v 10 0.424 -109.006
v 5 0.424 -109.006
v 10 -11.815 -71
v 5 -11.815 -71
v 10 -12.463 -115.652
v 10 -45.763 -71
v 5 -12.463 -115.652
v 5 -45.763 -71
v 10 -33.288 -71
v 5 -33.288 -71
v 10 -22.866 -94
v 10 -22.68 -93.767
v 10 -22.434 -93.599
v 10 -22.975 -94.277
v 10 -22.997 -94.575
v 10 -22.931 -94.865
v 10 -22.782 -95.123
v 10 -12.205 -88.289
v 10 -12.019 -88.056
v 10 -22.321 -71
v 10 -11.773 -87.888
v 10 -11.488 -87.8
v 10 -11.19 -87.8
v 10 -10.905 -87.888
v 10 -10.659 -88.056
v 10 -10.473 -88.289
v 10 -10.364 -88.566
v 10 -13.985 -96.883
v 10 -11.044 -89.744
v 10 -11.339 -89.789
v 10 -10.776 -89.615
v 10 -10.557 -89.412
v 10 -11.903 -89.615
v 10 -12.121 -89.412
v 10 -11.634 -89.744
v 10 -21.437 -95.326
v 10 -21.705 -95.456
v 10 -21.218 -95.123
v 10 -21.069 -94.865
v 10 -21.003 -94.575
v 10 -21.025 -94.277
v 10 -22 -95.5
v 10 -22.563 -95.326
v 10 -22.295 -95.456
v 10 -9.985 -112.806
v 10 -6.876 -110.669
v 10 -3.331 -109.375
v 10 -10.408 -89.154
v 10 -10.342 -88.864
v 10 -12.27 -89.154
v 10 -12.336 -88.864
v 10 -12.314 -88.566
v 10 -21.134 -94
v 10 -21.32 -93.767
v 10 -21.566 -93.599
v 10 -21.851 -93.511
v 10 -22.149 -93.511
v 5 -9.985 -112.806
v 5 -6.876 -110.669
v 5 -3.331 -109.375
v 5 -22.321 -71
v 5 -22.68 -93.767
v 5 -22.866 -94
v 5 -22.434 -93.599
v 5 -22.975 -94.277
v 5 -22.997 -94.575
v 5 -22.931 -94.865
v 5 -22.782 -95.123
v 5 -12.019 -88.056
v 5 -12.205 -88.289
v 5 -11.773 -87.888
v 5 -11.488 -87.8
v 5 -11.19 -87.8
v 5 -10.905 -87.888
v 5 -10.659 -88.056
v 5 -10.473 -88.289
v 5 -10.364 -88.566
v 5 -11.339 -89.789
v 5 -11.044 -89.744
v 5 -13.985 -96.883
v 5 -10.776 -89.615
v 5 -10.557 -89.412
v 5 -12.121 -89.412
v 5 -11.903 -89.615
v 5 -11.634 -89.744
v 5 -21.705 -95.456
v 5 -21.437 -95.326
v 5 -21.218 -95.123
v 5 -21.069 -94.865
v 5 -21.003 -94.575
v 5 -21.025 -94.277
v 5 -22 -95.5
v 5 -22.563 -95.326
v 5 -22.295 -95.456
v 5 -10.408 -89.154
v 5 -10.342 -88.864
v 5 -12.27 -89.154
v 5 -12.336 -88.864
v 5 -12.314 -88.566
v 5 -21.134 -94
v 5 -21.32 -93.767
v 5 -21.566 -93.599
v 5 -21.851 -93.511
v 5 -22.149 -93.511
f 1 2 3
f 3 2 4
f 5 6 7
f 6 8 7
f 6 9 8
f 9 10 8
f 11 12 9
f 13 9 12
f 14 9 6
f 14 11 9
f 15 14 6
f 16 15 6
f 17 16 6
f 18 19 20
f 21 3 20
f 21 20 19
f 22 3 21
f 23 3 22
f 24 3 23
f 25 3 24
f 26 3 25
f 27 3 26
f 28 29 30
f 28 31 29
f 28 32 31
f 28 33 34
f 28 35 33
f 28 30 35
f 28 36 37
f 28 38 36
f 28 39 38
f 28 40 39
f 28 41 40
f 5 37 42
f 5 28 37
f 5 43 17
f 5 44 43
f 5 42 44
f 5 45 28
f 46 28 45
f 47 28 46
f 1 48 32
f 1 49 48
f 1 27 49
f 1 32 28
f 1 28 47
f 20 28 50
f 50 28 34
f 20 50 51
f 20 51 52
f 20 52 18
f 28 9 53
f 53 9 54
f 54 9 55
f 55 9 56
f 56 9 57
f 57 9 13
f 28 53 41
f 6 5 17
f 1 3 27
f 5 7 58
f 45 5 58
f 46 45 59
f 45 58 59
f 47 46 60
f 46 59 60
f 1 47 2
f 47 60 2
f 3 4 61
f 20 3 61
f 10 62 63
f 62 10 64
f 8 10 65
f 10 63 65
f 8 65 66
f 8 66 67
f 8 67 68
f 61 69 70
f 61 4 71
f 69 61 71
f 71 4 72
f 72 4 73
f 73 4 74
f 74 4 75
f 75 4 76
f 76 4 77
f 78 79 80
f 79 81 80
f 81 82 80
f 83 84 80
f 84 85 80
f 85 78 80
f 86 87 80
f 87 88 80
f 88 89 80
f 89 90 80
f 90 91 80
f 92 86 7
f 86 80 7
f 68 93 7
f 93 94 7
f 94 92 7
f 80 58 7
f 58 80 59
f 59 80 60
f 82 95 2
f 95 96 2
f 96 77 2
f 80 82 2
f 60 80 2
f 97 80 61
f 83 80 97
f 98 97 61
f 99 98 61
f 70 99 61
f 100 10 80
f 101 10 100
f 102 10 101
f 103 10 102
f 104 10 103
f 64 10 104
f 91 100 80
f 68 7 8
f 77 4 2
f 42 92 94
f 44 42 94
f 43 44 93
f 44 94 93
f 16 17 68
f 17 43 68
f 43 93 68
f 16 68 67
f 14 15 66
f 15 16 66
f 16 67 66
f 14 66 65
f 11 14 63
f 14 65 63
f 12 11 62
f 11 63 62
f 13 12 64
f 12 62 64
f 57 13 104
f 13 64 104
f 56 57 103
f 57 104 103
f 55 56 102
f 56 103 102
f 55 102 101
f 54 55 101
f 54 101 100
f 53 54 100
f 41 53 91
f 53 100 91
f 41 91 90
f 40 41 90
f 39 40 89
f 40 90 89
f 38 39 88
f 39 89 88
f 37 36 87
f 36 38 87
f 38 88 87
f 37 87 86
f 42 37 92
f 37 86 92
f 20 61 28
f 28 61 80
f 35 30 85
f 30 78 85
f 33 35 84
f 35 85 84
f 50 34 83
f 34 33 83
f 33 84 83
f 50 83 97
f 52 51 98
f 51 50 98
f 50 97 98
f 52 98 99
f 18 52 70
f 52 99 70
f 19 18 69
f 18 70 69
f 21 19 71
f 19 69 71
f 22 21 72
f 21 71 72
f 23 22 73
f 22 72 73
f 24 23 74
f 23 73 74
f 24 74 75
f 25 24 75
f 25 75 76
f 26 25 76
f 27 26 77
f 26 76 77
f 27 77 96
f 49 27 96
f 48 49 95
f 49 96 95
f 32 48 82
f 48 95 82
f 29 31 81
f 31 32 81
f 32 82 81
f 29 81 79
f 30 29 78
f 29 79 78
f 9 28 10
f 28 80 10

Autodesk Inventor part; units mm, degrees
ref_plane "YZ Plane" through (0, 0, 0) normal (1, 0, 0) x (0, 1, 0)
ref_plane "XZ Plane" through (0, 0, 0) normal (0, 1, 0) x (-1, 0, 0)
ref_plane "XY Plane" through (0, 0, 0) normal (0, 0, 1) x (1, 0, 0)
sketch "Sketch1" plane through (0, 0, 0) normal (1, 0, 0) x (0, 1, 0)
  circle A0 centre (0, -124) radius 1.95
  circle A1 centre (0, 124) radius 1.95
  circle A2 centre (-19, -65) radius 1.5
  circle A3 centre (-19, 65) radius 1.5
  line L0 (0, 124) -> (-19, 65) construction
  line L1 (4.7593, 122.4673) -> (-14.2407, 63.4673)
  line L2 (-23.7593, 66.5327) -> (-4.7593, 125.5327)
  arc A4 (4.7593, 122.4673) -> (-4.7593, 125.5327) centre (0, 124) ccw
  arc A5 (-23.7593, 66.5327) -> (-14.2407, 63.4673) centre (-19, 65) ccw
  line L3 (-19, 65) -> (-19, -65) construction
  line L4 (-24, 65) -> (-24, -65)
  line L5 (-14, -65) -> (-14, 65)
  arc A6 (-14, 65) -> (-24, 65) centre (-19, 65) ccw
  arc A7 (-24, -65) -> (-14, -65) centre (-19, -65) ccw
  line L6 (-19, -65) -> (0, -124) construction
  line L7 (-23.7593, -66.5327) -> (-4.7593, -125.5327)
  line L8 (4.7593, -122.4673) -> (-14.2407, -63.4673)
  arc A8 (-14.2407, -63.4673) -> (-23.7593, -66.5327) centre (-19, -65) ccw
  arc A9 (-4.7593, -125.5327) -> (4.7593, -122.4673) centre (0, -124) ccw
  circle A10 centre (-44, 65) radius 1.5
  circle A11 centre (-44, -65) radius 1.5
  line L9 (-19, 65) -> (-44, 65) construction
  line L10 (-19, 67) -> (-44, 67)
  line L11 (-44, 63) -> (-19, 63)
  arc A12 (-19, 63) -> (-19, 67) centre (-19, 65) ccw
  arc A13 (-44, 67) -> (-44, 63) centre (-44, 65) ccw
  line L12 (-19, -65) -> (-44, -65) construction
  line L13 (-19, -63) -> (-44, -63)
  line L14 (-44, -67) -> (-19, -67)
  arc A14 (-19, -67) -> (-19, -63) centre (-19, -65) ccw
  arc A15 (-44, -63) -> (-44, -67) centre (-44, -65) ccw
  line L15 (0, 124) -> (-44, 65) construction
  line L16 (-4.0081, 126.9891) -> (-48.0081, 67.9891)
  line L17 (-39.9919, 62.0109) -> (4.0081, 121.0109)
  arc A16 (4.0081, 121.0109) -> (-4.0081, 126.9891) centre (0, 124) ccw
  arc A17 (-48.0081, 67.9891) -> (-39.9919, 62.0109) centre (-44, 65) ccw
  line L18 (-44, -65) -> (0, -124) construction
  line L19 (-48.0081, -67.9891) -> (-4.0081, -126.9891)
  line L20 (4.0081, -121.0109) -> (-39.9919, -62.0109)
  arc A18 (-39.9919, -62.0109) -> (-48.0081, -67.9891) centre (-44, -65) ccw
  arc A19 (-4.0081, -126.9891) -> (4.0081, -121.0109) centre (0, -124) ccw
  line L21 (-44, 65) -> (-44, -65) construction
  line L22 (-46.5, 65) -> (-46.5, -65)
  line L23 (-41.5, -65) -> (-41.5, 65)
  arc A20 (-41.5, 65) -> (-46.5, 65) centre (-44, 65) ccw
  arc A21 (-46.5, -65) -> (-41.5, -65) centre (-44, -65) ccw
  line L24 (-44, 65) -> (-19, 0) construction
  line L25 (-45.4, 64.4615) -> (-20.4, -0.5385)
  line L26 (-17.6, 0.5385) -> (-42.6, 65.5385)
  arc A22 (-42.6, 65.5385) -> (-45.4, 64.4615) centre (-44, 65) ccw
  arc A23 (-20.4, -0.5385) -> (-17.6, 0.5385) centre (-19, 0) ccw
  line L27 (-44, -65) -> (-19, 0) construction
  line L28 (-42.6, -65.5385) -> (-17.6, -0.5385)
  line L29 (-20.4, 0.5385) -> (-45.4, -64.4615)
  arc A24 (-45.4, -64.4615) -> (-42.6, -65.5385) centre (-44, -65) ccw
  arc A25 (-17.6, -0.5385) -> (-20.4, 0.5385) centre (-19, 0) ccw
  line L30 (-19, 0) -> (-44, 0) construction
  line L31 (-19, 1.5) -> (-44, 1.5)
  line L32 (-44, -1.5) -> (-19, -1.5)
  arc A26 (-19, -1.5) -> (-19, 1.5) centre (-19, 0) ccw
  arc A27 (-44, 1.5) -> (-44, -1.5) centre (-44, 0) ccw
  circle A28 centre (-19, -10) radius 1.5
  circle A29 centre (-19, -35) radius 1.5
  circle A30 centre (-19, 10) radius 1.5
  circle A31 centre (-19, 35) radius 1.5
  circle A32 centre (0, -124) radius 12.5
  circle A33 centre (0, 124) radius 12.5
  circle A34 centre (-22, 94.5) radius 1
  circle A35 centre (-22, -94.5) radius 1
  circle A36 centre (-11.3392, 88.7888) radius 1
  circle A37 centre (-11.3392, -88.7888) radius 1
  circle A38 centre (-19, 0) radius 1
  point P0 (0, 0)
  point P1 (-9.5, 94.5)
  point P2 (-9.5, -94.5)
  point P3 (-14, -64.2148)
  point P4 (-14, 64.2148)
  point P5 (-24, 65)
  point P6 (-31.5, 65)
  point P7 (-31.5, -65)
  point P8 (-44, 0)
  point P9 (-31.5, 32.5)
  point P10 (-31.5, -32.5)
  point P11 (-41.5, 54.3215)
  point P12 (-24, 8.8215)
  point P13 (-24, 17.1785)
  point P14 (-41.6236, 63)
  point P15 (-24, 63)
  point P16 (-23.6088, 67)
  point P17 (-36.2712, 67)
  point P18 (-13.9854, 96.8832)
  point P19 (-6.8749, 118.9633)
  point P20 (-43.3898, 70)
  point P21 (-46.5, -65)
  point P22 (-43.3898, -70)
  point P23 (-6.8749, -118.9633)
  point P24 (-13.9854, -96.8832)
  point P25 (-36.2712, -67)
  point P26 (-23.6088, -67)
  point P27 (-24, -63)
  point P28 (-41.6236, -63)
  point P29 (-24, -17.1785)
  point P30 (-24, -8.8215)
  point P31 (-41.5, -54.3215)
  point P32 (-31.5, 0)
  point P33 (-41.5, -1.5)
  point P34 (-24, -1.5)
  point P35 (-24, 1.5)
  point P36 (-41.5, 1.5)
  point P37 (-46.5, 60.6699)
  point P38 (-46.5, -60.6699)
  point P39 (-4.0081, -126.9891)
  point P40 (-41.5, 63)
  point P41 (-23.5826, 67)
  point P42 (-41.5, -63)
  point P43 (-41.5, -62.6785)
  point P44 (-41.5, 62.6785)
  point P45 (-10.8571, -117.8053)
  point P46 (1.2475, -111.5624)
  point P47 (-10.8571, 117.8053)
  point P48 (1.2475, 111.5624)
  point P49 (-40.8878, -61.0867)
  point P50 (-41.5, 60.6699)
  dimension "d2" = 3.9
  dimension "d4" = 3.9
  dimension "d25" = 3
  dimension "d28" = 3
  dimension "d43" = 59
  dimension "d44" = 65
  dimension "d45" = 65
  dimension "d47" = 59
  dimension "d48" = 10
  dimension "d49" = 10
  dimension "d50" = 10
  dimension "d52" = 14
  dimension "d53" = 3
  dimension "d54" = 3
  dimension "d55" = 4
  dimension "d56" = 4
  dimension "d57" = 25
  dimension "d58" = 25
  dimension "d59" = 10
  dimension "d60" = 10
  dimension "d61" = 5
  dimension "d62" = 3
  dimension "d63" = 3
  dimension "d64" = 3
  dimension "d65" = 3
  dimension "d66" = 3
  dimension "d67" = 10
  dimension "d68" = 25
  dimension "d69" = 3
  dimension "d70" = 3
  dimension "d71" = 10
  dimension "d72" = 25
  dimension "d73" = 25
  dimension "d74" = 25
  dimension "d76" = 2
  dimension "d78" = 2
  dimension "d79" = 2
  dimension "d80" = 2
  dimension "d81" = 6
  dimension "d82" = 6
  dimension "d83" = 2
extrude "Extrusion1" add sketch "Sketch1" along normal blind 5 contours A4 L16 A33 L1 | A16 L17 A33 L2 A4 | L1 A33 L17 A16 | L1 L5 A6 L10 L2 L17 A33 | A4 L2 A33 L16 | L5 L8 A8 L13 L4 L28 A23 L26 L11 A5 L1 | L1 A5 L11 A12 L10 A6 L5 | L17 L2 A33 | A33 L2 L17 L10 A20 L22 A17 L16 | L8 A32 L20 L7 L14 A7 L5 | L5 A7 L14 A14 L13 A8 L8 | L11 L4 A5 | A5 A6 L10 A12 L11 | A32 L19 A9 L8 | L8 A19 L20 A32 | A6 L2 L10 | L2 A5 L4 L11 L17 L10 | L17 L11 L23 A20 L10 | L22 A20 L10 A13 L25 A17 | A17 L25 L23 L31 A27 L32 L29 A18 L22 | L14 L7 A7 | A7 A8 L13 A14 L14 | A9 L7 A32 L20 A19 | A32 L7 L20 | A8 L4 L13 | A20 L23 L11 L26 A10 L25 A13 L10 | L25 A13 L11 L26 L23 A17 | A17 L23 L25 | L22 A21 L14 L20 L7 A32 L19 A18 | A18 L29 A15 L14 A21 L22 | L26 A25 L31 L25 L4 | L4 L25 L23 A17 L26 | L7 L14 L20 L13 L4 A7 | L19 A32 L7 A9 | L23 L26 L11 | L23 L26 A17 | L25 A10 L26 L11 A13 | L29 L23 A18 | A18 L23 L28 L13 A15 L29 | L25 L31 L4 | A23 L25 L29 A25 | L14 A21 L23 L13 L20 | L28 A18 L23 L29 L4 | L4 L29 L32 A23 L28 | L31 L4 L32 L23 | L23 L32 A27 L31 | A18 L28 L23 | L29 A11 L28 L13 L23 A21 L14 A15 | A15 L13 L28 A11 L29 | L31 L25 L29 L32 L4 | L31 A25 L29 L25 | L4 L32 L29 | L25 A23 L32 L29
sketch "Sketch8" plane through (5, 0, 0) normal (1, 0, 0) x (0, 0, -1)
  line L0 (-54.3215, -41.5) -> (-1.5, -41.5) projected
  line L1 (-1.5, -41.5) -> (-1.5, -24) projected
  line L2 (-1.5, -24) -> (-8.8215, -24) projected
  line L3 (-8.8215, -24) -> (-54.3215, -41.5) projected
  line L4 (1.5, -24) -> (1.5, -41.5) projected
  line L5 (1.5, -41.5) -> (54.3215, -41.5) projected
  line L6 (54.3215, -41.5) -> (8.8215, -24) projected
  line L7 (8.8215, -24) -> (1.5, -24) projected
  line L8 (-67, -23.6088) -> (-96.8832, -13.9854) projected
  line L9 (-96.8832, -13.9854) -> (-67, -36.2712) projected
  line L10 (-67, -36.2712) -> (-67, -23.6088) projected
  line L11 (63, -24) -> (17.1785, -24) projected
  line L12 (17.1785, -24) -> (63, -41.6236) projected
  line L13 (63, -41.6236) -> (63, -24) projected
  circle A0 centre (-65, -44) radius 1.5 projected
  circle A1 centre (124, 0) radius 1.95 projected
  circle A2 centre (-124, 0) radius 1.95 projected
  circle A3 centre (-94.5, -22) radius 1 projected
  circle A4 centre (-35, -19) radius 1.5 projected
  circle A5 centre (-10, -19) radius 1.5 projected
  circle A6 centre (35, -19) radius 1.5 projected
  circle A7 centre (10, -19) radius 1.5 projected
  circle A8 centre (65, -19) radius 1.5 projected
  circle A9 centre (88.7888, -11.3392) radius 1 projected
  circle A10 centre (-65, -19) radius 1.5 projected
  circle A11 centre (-88.7888, -11.3392) radius 1 projected
  circle A12 centre (94.5, -22) radius 1 projected
  circle A13 centre (65, -44) radius 1.5 projected
  line L14 (67, -23.6088) -> (67, -36.2712) projected
  line L15 (67, -36.2712) -> (96.8832, -13.9854) projected
  line L16 (96.8832, -13.9854) -> (67, -23.6088) projected
  line L17 (-62.6785, -41.5) -> (-17.1785, -24) projected
  line L18 (-17.1785, -24) -> (-63, -24) projected
  line L19 (-63, -24) -> (-63, -41.5) projected
  line L20 (-63, -41.5) -> (-62.6785, -41.5) projected
  arc A14 (117.8053, -10.8571) -> (111.5624, 1.2475) centre (124, 0) ccw projected
  line L21 (117.8053, -10.8571) -> (67.9891, -48.0081) projected
  arc A15 (60.6699, -46.5) -> (67.9891, -48.0081) centre (65, -44) ccw projected
  line L22 (60.6699, -46.5) -> (-60.6699, -46.5) projected
  arc A16 (-67.9891, -48.0081) -> (-60.6699, -46.5) centre (-65, -44) ccw projected
  line L23 (-67.9891, -48.0081) -> (-117.8053, -10.8571) projected
  arc A17 (-111.5624, 1.2475) -> (-117.8053, -10.8571) centre (-124, 0) ccw projected
  line L24 (-111.5624, 1.2475) -> (-64.2148, -14) projected
  line L25 (-64.2148, -14) -> (64.2148, -14) projected
  line L26 (64.2148, -14) -> (111.5624, 1.2475) projected
  circle A18 centre (0, -19) radius 1 projected
  point P0 (0, 0)
sketch "Sketch9" plane through (5, 0, 0) normal (1, 0, 0) x (0, 0, -1)
  circle A0 centre (124, 0) radius 1.95 projected
  circle A1 centre (124, 0) radius 15
  line L0 (111.5624, 1.2475) -> (64.2148, -14) projected
  circle A2 centre (88.7888, -11.3392) radius 1 projected
  line L1 (67, -23.6088) -> (96.8832, -13.9854) projected
  line L2 (96.8832, -13.9854) -> (67, -36.2712) projected
  line L3 (67.9891, -48.0081) -> (117.8053, -10.8571) projected
  circle A3 centre (94.5, -22) radius 1 projected
  line L4 (71, -11.8149) -> (71, -45.7627)
  circle A4 centre (65, -19) radius 1.5 projected
  point P0 (0, 0)
  point P1 (71, -33.2881)
  point P2 (115.6524, -12.4626)
  point P3 (109.006, 0.4243)
  point P4 (71, -22.3207)
  dimension "d84" = 30
  dimension "d85" = 6
extrude "Extrusion4" add sketch "Sketch9" along normal blind 5 contours A1 L3 L4 L2 L1 L0
sketch "Sketch10" plane through (5, 0, 0) normal (1, 0, 0) x (0, 0, -1)
  line L0 (-181.8877, 79.6872) -> (179.0889, 79.6872)
  line L1 (179.0889, 79.6872) -> (179.0889, -93.8152)
  line L2 (179.0889, -93.8152) -> (-181.8877, -93.8152)
  line L3 (-181.8877, -93.8152) -> (-181.8877, 79.6872)
  point P0 (0, 0)
extrude "Extrusion5" cut sketch "Sketch10" against normal blind 10
properties part number "Horizontal_bar_reinforcement_V2"
